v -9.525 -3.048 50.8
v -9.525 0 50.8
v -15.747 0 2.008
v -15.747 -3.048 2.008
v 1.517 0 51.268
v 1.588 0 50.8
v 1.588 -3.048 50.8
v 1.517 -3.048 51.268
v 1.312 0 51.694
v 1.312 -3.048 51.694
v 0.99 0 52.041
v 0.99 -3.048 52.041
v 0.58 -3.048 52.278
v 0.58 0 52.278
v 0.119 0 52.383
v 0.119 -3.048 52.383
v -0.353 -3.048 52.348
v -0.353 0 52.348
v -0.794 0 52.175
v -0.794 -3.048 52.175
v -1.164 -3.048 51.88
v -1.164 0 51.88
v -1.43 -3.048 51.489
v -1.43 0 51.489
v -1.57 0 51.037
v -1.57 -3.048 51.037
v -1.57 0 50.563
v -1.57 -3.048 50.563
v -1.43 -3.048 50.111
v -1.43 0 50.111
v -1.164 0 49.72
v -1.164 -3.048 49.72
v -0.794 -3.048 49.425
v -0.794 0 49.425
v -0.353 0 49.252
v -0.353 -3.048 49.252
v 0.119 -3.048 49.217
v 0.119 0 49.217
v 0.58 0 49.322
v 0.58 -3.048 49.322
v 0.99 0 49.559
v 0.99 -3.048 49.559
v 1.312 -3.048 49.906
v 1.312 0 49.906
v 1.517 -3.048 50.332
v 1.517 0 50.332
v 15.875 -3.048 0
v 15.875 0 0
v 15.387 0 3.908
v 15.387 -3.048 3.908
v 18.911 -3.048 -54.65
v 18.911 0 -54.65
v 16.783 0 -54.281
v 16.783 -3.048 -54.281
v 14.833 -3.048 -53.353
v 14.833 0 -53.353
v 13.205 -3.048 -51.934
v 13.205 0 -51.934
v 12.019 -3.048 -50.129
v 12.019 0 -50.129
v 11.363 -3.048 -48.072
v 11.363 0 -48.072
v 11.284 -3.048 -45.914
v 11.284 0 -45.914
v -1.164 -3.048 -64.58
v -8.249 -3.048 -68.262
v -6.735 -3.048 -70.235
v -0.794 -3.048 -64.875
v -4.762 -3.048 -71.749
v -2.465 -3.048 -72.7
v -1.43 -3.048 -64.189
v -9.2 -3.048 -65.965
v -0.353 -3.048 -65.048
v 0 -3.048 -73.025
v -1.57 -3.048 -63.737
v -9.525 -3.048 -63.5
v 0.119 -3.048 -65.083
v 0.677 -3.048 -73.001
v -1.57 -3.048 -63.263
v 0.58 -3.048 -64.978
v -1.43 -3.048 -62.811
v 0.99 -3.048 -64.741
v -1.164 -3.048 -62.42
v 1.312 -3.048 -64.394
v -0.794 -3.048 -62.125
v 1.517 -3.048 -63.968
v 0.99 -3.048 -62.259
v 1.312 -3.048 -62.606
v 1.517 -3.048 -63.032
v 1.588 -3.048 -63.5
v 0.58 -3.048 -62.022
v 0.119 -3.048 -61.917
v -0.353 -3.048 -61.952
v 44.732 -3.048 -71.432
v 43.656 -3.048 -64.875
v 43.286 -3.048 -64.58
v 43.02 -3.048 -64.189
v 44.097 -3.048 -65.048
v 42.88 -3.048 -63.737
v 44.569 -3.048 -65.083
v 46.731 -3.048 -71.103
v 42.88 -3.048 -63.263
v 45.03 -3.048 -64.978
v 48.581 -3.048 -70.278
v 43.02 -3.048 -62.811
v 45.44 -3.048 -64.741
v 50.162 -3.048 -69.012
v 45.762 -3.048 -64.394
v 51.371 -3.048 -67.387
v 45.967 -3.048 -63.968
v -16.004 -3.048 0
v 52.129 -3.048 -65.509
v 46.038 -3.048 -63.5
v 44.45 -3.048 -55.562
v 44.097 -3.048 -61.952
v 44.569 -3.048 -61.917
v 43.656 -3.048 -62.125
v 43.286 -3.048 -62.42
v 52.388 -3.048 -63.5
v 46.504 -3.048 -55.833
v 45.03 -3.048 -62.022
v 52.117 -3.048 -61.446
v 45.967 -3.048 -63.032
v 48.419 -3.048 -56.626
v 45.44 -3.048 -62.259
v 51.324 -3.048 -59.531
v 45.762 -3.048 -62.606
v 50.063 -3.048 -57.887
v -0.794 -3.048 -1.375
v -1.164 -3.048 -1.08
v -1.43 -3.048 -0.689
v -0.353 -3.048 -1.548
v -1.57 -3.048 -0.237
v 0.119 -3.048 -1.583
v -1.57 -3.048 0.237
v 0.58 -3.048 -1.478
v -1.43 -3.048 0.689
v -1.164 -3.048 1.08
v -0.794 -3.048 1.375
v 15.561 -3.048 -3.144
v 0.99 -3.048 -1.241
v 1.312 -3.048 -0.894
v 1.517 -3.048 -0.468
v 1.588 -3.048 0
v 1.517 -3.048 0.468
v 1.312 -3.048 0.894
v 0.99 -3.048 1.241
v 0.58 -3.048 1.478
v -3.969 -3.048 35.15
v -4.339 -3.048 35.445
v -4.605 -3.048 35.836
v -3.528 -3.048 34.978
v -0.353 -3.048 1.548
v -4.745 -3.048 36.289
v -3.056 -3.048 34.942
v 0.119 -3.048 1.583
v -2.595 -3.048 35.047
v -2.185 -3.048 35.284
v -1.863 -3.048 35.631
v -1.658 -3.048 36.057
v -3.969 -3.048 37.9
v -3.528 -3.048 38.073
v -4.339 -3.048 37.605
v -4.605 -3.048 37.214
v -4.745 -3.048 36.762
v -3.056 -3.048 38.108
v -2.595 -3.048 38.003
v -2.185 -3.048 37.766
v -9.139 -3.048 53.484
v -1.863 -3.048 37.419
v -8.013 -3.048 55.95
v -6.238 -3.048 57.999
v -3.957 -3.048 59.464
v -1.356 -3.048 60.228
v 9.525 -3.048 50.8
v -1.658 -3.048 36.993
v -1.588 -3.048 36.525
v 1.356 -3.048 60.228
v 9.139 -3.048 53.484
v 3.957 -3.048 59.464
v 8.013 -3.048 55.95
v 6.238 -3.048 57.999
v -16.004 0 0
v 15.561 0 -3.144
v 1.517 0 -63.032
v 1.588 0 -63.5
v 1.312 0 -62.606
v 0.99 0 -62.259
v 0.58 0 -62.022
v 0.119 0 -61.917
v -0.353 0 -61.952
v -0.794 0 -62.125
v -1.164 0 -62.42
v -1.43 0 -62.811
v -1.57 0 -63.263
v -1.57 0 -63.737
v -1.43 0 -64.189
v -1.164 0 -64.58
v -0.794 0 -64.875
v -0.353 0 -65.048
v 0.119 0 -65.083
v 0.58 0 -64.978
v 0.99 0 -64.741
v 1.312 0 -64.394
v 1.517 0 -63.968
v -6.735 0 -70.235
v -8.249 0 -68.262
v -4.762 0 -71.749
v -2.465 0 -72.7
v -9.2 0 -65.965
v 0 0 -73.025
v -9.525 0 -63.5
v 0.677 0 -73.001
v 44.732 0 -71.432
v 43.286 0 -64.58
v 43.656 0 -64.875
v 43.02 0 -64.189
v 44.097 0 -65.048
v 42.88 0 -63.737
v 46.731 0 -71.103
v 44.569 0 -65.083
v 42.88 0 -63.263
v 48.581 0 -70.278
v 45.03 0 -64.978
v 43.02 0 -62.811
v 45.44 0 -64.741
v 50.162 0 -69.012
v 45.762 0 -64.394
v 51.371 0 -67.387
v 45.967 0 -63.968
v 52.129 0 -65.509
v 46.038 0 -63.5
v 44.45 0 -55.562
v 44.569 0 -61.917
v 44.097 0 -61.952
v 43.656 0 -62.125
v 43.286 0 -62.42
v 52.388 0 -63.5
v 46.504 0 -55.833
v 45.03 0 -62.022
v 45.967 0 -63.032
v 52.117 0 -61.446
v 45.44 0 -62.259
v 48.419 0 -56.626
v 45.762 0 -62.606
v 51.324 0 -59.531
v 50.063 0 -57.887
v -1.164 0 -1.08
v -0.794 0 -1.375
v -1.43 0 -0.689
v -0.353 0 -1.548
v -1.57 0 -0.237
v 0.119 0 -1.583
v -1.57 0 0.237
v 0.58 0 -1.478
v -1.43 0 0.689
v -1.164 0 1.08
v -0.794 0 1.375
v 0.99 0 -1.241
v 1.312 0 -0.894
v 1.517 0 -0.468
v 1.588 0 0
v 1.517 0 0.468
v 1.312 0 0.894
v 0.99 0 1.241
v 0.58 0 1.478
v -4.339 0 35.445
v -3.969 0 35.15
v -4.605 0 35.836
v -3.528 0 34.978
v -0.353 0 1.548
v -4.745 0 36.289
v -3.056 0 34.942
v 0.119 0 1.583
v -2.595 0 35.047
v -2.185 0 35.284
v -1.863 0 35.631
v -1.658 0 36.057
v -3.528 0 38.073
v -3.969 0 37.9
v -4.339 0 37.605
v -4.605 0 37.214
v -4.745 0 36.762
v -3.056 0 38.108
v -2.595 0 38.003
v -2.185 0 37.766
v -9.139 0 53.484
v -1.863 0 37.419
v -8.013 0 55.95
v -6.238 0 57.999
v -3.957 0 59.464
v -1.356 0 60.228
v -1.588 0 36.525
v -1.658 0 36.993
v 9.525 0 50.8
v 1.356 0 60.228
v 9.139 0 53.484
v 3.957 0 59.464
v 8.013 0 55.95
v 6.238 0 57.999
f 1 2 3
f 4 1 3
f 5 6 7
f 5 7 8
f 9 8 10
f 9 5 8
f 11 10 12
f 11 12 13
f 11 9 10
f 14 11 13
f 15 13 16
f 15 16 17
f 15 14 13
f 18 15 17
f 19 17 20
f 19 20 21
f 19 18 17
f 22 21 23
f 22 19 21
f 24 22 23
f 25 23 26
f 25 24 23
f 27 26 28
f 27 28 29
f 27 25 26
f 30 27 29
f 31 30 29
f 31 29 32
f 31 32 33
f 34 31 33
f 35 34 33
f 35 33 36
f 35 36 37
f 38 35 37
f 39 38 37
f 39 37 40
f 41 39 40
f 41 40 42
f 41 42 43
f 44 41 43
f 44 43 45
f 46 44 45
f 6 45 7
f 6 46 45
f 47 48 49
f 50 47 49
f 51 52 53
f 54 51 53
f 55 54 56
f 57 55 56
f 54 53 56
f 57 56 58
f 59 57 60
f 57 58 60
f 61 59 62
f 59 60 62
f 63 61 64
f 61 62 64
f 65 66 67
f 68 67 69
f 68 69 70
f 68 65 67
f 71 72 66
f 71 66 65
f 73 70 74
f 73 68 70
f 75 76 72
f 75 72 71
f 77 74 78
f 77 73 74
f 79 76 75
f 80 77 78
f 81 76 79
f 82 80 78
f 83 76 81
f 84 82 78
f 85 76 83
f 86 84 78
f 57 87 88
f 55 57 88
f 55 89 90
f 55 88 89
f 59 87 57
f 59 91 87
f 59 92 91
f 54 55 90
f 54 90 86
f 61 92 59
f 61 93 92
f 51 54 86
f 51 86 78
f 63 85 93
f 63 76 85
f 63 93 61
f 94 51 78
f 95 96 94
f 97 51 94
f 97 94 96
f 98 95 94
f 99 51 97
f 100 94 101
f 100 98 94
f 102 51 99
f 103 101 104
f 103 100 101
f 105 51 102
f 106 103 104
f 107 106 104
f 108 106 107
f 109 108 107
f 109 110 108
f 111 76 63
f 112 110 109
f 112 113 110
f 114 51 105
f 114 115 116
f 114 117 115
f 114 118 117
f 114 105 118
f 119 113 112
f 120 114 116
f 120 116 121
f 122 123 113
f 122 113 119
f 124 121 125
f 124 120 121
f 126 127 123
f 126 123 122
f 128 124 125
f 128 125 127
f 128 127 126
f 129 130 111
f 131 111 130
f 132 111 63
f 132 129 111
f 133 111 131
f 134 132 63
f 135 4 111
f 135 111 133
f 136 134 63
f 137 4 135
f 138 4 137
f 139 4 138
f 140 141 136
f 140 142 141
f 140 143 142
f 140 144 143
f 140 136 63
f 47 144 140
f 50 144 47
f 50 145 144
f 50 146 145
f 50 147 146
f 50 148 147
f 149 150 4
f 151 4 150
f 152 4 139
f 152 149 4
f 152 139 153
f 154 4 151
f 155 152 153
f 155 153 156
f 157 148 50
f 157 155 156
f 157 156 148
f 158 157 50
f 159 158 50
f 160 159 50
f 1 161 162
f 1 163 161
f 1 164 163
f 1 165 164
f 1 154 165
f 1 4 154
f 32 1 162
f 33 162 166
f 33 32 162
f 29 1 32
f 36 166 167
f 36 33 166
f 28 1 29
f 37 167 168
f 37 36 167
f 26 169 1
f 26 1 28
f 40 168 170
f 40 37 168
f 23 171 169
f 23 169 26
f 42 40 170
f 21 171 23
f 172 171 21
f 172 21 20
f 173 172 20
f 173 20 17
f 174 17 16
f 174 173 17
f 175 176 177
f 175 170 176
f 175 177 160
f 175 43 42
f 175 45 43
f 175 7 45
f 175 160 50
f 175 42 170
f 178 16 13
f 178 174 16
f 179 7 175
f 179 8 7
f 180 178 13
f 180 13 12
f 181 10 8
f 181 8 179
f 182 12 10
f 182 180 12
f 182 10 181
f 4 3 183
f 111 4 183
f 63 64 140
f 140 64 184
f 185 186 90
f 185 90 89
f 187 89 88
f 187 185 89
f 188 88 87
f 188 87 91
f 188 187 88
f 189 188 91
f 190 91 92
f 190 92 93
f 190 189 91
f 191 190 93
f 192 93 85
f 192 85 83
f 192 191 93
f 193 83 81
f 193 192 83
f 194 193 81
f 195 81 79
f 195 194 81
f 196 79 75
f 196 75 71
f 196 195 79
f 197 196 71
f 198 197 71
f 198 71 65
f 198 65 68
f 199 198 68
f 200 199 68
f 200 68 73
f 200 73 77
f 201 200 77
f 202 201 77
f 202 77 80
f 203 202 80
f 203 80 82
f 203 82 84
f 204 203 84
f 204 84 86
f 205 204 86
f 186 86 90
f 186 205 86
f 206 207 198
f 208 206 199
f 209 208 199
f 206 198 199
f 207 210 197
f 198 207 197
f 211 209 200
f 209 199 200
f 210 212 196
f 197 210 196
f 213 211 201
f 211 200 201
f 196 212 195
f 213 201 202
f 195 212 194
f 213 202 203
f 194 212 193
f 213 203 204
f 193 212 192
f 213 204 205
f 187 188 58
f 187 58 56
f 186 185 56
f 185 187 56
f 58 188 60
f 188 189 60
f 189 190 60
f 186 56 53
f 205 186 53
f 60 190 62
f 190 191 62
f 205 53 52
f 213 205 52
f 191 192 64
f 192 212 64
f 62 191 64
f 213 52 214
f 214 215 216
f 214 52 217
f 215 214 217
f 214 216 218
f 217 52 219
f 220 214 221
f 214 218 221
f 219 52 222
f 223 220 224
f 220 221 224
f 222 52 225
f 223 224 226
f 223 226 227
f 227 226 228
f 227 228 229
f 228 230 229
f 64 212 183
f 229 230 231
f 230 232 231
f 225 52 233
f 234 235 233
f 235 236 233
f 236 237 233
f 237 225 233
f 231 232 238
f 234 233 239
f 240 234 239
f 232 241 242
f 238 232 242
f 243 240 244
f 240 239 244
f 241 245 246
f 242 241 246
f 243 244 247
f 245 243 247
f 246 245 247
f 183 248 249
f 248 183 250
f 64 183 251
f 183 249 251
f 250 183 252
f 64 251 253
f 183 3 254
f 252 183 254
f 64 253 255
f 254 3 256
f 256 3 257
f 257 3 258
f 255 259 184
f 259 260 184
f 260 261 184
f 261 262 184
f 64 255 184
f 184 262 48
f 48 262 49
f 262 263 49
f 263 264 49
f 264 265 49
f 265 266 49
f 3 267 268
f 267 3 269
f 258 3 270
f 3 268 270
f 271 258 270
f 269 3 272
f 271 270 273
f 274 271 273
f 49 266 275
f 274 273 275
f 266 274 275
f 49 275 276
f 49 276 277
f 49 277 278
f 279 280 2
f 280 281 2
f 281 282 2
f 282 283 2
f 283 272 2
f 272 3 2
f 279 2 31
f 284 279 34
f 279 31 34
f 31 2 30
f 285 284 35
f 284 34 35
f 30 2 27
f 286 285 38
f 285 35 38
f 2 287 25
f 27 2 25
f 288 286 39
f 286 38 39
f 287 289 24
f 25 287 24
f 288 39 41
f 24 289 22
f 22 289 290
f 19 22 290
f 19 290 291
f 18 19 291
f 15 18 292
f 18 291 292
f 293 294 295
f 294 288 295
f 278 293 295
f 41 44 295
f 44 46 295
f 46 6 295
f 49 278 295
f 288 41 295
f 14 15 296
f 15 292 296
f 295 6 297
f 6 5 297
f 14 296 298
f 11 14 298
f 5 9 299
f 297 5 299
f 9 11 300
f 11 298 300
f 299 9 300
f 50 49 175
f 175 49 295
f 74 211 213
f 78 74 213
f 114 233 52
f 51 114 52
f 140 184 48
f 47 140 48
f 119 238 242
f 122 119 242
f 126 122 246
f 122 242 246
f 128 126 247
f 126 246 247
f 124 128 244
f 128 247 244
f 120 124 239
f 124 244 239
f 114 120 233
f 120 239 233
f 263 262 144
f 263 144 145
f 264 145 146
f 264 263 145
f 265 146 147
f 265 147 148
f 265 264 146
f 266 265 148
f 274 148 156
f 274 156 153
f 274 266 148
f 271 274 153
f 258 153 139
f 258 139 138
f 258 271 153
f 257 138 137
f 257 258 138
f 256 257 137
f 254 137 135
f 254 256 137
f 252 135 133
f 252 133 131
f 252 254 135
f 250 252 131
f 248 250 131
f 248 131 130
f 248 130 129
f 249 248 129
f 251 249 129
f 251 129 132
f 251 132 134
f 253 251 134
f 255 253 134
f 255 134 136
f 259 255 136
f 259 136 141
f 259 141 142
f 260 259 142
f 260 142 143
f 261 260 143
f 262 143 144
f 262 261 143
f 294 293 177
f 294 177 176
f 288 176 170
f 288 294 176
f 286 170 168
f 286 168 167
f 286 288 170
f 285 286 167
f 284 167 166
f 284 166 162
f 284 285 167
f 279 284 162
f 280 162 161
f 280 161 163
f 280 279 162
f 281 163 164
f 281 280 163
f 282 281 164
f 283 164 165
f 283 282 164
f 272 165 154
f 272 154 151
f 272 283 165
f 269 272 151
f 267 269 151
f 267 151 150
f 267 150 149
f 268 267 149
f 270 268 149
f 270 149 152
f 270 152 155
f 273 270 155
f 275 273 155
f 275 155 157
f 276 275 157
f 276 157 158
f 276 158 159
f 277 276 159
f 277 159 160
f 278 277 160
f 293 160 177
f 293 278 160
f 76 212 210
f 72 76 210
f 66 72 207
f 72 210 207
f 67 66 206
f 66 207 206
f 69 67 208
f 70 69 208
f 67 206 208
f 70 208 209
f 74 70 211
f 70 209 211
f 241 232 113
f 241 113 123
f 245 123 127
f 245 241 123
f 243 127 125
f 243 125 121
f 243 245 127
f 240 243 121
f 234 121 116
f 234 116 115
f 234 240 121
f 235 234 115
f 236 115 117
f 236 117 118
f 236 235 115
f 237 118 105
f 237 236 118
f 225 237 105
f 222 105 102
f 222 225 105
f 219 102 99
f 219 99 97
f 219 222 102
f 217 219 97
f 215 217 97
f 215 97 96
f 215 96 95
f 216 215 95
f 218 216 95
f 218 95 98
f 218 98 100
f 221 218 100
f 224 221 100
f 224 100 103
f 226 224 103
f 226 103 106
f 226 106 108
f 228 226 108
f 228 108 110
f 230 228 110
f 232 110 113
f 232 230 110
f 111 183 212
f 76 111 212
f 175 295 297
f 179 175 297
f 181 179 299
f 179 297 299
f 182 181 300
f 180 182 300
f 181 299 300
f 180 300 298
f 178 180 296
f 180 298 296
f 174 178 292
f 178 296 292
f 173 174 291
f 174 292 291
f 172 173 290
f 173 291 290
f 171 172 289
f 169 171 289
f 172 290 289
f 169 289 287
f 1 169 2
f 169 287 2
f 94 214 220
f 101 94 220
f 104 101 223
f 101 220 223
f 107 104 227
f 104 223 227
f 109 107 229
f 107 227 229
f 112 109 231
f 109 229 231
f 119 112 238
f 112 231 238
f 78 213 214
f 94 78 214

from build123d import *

# Parameters (mm, degrees)
F0_R     = 1.5875
F1_DEPTH = 3.048


with BuildPart() as f1:
    # F0 (on Front) → F1 (new body)
    with BuildSketch(Plane.XZ):
        with BuildLine():
            ThreePointArc((-9.525, 50.8), (0, 41.275), (9.525, 50.8))
            ThreePointArc((9.525, 50.8), (0, 60.325), (-9.525, 50.8))
        make_face()
        with Locations((0, 50.8)):
            Circle(F0_R, mode=Mode.SUBTRACT)
        with BuildLine():
            Line((15.386538, 3.907692), (9.525, 50.8))
            ThreePointArc((9.525, 50.8), (0, 41.275), (-9.525, 50.8))
            Line((-9.525, 50.8), (-15.747457, 2.00829))
            ThreePointArc((-15.747457, 2.00829), (-0.966694, 15.84554), (15.386538, 3.907692))
        make_face()
        with Locations((-3.175, 36.5252)):
            Circle(F0_R, mode=Mode.SUBTRACT)
        with BuildLine():
            Line((15.875, 0), (15.386538, 3.907692))
            ThreePointArc((15.386538, 3.907692), (-0.966694, 15.84554), (-15.747457, 2.00829))
            ThreePointArc((-15.747457, 2.00829), (-2.57762, -15.664338), (15.560644, -3.143564))
            Line((15.560644, -3.143564), (15.875, 0))
        make_face()
        Circle(F0_R, mode=Mode.SUBTRACT)
        with BuildLine():
            ThreePointArc((15.560644, -3.143564), (-2.57762, -15.664338), (-15.747457, 2.00829))
            Line((-15.747457, 2.00829), (-16.003576, 0))
            Line((-16.003576, 0), (-9.525, -63.5))
            ThreePointArc((-9.525, -63.5), (0, -53.975), (9.525, -63.5))
            ThreePointArc((9.525, -63.5), (6.970557, -69.991299), (0.677344, -73.000886))
            Line((0.677344, -73.000886), (44.732405, -71.432475))
            ThreePointArc((44.732405, -71.432475), (36.513756, -63.641225), (44.45, -55.5625))
            Line((44.45, -55.5625), (18.910573, -54.650378))
            ThreePointArc((18.910573, -54.650378), (13.205355, -51.933808), (11.283583, -45.914169))
            Line((11.283583, -45.914169), (15.560644, -3.143564))
        make_face()
        with BuildLine():
            ThreePointArc((52.3875, -63.5), (50.06266, -57.88734), (44.45, -55.5625))
            ThreePointArc((44.45, -55.5625), (36.513756, -63.641225), (44.732405, -71.432475))
            ThreePointArc((44.732405, -71.432475), (50.161633, -69.01191), (52.3875, -63.5))
        make_face()
        with Locations((44.45, -63.5)):
            Circle(F0_R, mode=Mode.SUBTRACT)
        with BuildLine():
            ThreePointArc((9.525, -63.5), (0, -53.975), (-9.525, -63.5))
            ThreePointArc((-9.525, -63.5), (-6.735192, -70.235192), (0, -73.025))
            Line((0, -73.025), (0.677344, -73.000886))
            ThreePointArc((0.677344, -73.000886), (6.970557, -69.991299), (9.525, -63.5))
        make_face()
        with Locations((0, -63.5)):
            Circle(F0_R, mode=Mode.SUBTRACT)
    extrude(amount=F1_DEPTH)


solid = f1.part
